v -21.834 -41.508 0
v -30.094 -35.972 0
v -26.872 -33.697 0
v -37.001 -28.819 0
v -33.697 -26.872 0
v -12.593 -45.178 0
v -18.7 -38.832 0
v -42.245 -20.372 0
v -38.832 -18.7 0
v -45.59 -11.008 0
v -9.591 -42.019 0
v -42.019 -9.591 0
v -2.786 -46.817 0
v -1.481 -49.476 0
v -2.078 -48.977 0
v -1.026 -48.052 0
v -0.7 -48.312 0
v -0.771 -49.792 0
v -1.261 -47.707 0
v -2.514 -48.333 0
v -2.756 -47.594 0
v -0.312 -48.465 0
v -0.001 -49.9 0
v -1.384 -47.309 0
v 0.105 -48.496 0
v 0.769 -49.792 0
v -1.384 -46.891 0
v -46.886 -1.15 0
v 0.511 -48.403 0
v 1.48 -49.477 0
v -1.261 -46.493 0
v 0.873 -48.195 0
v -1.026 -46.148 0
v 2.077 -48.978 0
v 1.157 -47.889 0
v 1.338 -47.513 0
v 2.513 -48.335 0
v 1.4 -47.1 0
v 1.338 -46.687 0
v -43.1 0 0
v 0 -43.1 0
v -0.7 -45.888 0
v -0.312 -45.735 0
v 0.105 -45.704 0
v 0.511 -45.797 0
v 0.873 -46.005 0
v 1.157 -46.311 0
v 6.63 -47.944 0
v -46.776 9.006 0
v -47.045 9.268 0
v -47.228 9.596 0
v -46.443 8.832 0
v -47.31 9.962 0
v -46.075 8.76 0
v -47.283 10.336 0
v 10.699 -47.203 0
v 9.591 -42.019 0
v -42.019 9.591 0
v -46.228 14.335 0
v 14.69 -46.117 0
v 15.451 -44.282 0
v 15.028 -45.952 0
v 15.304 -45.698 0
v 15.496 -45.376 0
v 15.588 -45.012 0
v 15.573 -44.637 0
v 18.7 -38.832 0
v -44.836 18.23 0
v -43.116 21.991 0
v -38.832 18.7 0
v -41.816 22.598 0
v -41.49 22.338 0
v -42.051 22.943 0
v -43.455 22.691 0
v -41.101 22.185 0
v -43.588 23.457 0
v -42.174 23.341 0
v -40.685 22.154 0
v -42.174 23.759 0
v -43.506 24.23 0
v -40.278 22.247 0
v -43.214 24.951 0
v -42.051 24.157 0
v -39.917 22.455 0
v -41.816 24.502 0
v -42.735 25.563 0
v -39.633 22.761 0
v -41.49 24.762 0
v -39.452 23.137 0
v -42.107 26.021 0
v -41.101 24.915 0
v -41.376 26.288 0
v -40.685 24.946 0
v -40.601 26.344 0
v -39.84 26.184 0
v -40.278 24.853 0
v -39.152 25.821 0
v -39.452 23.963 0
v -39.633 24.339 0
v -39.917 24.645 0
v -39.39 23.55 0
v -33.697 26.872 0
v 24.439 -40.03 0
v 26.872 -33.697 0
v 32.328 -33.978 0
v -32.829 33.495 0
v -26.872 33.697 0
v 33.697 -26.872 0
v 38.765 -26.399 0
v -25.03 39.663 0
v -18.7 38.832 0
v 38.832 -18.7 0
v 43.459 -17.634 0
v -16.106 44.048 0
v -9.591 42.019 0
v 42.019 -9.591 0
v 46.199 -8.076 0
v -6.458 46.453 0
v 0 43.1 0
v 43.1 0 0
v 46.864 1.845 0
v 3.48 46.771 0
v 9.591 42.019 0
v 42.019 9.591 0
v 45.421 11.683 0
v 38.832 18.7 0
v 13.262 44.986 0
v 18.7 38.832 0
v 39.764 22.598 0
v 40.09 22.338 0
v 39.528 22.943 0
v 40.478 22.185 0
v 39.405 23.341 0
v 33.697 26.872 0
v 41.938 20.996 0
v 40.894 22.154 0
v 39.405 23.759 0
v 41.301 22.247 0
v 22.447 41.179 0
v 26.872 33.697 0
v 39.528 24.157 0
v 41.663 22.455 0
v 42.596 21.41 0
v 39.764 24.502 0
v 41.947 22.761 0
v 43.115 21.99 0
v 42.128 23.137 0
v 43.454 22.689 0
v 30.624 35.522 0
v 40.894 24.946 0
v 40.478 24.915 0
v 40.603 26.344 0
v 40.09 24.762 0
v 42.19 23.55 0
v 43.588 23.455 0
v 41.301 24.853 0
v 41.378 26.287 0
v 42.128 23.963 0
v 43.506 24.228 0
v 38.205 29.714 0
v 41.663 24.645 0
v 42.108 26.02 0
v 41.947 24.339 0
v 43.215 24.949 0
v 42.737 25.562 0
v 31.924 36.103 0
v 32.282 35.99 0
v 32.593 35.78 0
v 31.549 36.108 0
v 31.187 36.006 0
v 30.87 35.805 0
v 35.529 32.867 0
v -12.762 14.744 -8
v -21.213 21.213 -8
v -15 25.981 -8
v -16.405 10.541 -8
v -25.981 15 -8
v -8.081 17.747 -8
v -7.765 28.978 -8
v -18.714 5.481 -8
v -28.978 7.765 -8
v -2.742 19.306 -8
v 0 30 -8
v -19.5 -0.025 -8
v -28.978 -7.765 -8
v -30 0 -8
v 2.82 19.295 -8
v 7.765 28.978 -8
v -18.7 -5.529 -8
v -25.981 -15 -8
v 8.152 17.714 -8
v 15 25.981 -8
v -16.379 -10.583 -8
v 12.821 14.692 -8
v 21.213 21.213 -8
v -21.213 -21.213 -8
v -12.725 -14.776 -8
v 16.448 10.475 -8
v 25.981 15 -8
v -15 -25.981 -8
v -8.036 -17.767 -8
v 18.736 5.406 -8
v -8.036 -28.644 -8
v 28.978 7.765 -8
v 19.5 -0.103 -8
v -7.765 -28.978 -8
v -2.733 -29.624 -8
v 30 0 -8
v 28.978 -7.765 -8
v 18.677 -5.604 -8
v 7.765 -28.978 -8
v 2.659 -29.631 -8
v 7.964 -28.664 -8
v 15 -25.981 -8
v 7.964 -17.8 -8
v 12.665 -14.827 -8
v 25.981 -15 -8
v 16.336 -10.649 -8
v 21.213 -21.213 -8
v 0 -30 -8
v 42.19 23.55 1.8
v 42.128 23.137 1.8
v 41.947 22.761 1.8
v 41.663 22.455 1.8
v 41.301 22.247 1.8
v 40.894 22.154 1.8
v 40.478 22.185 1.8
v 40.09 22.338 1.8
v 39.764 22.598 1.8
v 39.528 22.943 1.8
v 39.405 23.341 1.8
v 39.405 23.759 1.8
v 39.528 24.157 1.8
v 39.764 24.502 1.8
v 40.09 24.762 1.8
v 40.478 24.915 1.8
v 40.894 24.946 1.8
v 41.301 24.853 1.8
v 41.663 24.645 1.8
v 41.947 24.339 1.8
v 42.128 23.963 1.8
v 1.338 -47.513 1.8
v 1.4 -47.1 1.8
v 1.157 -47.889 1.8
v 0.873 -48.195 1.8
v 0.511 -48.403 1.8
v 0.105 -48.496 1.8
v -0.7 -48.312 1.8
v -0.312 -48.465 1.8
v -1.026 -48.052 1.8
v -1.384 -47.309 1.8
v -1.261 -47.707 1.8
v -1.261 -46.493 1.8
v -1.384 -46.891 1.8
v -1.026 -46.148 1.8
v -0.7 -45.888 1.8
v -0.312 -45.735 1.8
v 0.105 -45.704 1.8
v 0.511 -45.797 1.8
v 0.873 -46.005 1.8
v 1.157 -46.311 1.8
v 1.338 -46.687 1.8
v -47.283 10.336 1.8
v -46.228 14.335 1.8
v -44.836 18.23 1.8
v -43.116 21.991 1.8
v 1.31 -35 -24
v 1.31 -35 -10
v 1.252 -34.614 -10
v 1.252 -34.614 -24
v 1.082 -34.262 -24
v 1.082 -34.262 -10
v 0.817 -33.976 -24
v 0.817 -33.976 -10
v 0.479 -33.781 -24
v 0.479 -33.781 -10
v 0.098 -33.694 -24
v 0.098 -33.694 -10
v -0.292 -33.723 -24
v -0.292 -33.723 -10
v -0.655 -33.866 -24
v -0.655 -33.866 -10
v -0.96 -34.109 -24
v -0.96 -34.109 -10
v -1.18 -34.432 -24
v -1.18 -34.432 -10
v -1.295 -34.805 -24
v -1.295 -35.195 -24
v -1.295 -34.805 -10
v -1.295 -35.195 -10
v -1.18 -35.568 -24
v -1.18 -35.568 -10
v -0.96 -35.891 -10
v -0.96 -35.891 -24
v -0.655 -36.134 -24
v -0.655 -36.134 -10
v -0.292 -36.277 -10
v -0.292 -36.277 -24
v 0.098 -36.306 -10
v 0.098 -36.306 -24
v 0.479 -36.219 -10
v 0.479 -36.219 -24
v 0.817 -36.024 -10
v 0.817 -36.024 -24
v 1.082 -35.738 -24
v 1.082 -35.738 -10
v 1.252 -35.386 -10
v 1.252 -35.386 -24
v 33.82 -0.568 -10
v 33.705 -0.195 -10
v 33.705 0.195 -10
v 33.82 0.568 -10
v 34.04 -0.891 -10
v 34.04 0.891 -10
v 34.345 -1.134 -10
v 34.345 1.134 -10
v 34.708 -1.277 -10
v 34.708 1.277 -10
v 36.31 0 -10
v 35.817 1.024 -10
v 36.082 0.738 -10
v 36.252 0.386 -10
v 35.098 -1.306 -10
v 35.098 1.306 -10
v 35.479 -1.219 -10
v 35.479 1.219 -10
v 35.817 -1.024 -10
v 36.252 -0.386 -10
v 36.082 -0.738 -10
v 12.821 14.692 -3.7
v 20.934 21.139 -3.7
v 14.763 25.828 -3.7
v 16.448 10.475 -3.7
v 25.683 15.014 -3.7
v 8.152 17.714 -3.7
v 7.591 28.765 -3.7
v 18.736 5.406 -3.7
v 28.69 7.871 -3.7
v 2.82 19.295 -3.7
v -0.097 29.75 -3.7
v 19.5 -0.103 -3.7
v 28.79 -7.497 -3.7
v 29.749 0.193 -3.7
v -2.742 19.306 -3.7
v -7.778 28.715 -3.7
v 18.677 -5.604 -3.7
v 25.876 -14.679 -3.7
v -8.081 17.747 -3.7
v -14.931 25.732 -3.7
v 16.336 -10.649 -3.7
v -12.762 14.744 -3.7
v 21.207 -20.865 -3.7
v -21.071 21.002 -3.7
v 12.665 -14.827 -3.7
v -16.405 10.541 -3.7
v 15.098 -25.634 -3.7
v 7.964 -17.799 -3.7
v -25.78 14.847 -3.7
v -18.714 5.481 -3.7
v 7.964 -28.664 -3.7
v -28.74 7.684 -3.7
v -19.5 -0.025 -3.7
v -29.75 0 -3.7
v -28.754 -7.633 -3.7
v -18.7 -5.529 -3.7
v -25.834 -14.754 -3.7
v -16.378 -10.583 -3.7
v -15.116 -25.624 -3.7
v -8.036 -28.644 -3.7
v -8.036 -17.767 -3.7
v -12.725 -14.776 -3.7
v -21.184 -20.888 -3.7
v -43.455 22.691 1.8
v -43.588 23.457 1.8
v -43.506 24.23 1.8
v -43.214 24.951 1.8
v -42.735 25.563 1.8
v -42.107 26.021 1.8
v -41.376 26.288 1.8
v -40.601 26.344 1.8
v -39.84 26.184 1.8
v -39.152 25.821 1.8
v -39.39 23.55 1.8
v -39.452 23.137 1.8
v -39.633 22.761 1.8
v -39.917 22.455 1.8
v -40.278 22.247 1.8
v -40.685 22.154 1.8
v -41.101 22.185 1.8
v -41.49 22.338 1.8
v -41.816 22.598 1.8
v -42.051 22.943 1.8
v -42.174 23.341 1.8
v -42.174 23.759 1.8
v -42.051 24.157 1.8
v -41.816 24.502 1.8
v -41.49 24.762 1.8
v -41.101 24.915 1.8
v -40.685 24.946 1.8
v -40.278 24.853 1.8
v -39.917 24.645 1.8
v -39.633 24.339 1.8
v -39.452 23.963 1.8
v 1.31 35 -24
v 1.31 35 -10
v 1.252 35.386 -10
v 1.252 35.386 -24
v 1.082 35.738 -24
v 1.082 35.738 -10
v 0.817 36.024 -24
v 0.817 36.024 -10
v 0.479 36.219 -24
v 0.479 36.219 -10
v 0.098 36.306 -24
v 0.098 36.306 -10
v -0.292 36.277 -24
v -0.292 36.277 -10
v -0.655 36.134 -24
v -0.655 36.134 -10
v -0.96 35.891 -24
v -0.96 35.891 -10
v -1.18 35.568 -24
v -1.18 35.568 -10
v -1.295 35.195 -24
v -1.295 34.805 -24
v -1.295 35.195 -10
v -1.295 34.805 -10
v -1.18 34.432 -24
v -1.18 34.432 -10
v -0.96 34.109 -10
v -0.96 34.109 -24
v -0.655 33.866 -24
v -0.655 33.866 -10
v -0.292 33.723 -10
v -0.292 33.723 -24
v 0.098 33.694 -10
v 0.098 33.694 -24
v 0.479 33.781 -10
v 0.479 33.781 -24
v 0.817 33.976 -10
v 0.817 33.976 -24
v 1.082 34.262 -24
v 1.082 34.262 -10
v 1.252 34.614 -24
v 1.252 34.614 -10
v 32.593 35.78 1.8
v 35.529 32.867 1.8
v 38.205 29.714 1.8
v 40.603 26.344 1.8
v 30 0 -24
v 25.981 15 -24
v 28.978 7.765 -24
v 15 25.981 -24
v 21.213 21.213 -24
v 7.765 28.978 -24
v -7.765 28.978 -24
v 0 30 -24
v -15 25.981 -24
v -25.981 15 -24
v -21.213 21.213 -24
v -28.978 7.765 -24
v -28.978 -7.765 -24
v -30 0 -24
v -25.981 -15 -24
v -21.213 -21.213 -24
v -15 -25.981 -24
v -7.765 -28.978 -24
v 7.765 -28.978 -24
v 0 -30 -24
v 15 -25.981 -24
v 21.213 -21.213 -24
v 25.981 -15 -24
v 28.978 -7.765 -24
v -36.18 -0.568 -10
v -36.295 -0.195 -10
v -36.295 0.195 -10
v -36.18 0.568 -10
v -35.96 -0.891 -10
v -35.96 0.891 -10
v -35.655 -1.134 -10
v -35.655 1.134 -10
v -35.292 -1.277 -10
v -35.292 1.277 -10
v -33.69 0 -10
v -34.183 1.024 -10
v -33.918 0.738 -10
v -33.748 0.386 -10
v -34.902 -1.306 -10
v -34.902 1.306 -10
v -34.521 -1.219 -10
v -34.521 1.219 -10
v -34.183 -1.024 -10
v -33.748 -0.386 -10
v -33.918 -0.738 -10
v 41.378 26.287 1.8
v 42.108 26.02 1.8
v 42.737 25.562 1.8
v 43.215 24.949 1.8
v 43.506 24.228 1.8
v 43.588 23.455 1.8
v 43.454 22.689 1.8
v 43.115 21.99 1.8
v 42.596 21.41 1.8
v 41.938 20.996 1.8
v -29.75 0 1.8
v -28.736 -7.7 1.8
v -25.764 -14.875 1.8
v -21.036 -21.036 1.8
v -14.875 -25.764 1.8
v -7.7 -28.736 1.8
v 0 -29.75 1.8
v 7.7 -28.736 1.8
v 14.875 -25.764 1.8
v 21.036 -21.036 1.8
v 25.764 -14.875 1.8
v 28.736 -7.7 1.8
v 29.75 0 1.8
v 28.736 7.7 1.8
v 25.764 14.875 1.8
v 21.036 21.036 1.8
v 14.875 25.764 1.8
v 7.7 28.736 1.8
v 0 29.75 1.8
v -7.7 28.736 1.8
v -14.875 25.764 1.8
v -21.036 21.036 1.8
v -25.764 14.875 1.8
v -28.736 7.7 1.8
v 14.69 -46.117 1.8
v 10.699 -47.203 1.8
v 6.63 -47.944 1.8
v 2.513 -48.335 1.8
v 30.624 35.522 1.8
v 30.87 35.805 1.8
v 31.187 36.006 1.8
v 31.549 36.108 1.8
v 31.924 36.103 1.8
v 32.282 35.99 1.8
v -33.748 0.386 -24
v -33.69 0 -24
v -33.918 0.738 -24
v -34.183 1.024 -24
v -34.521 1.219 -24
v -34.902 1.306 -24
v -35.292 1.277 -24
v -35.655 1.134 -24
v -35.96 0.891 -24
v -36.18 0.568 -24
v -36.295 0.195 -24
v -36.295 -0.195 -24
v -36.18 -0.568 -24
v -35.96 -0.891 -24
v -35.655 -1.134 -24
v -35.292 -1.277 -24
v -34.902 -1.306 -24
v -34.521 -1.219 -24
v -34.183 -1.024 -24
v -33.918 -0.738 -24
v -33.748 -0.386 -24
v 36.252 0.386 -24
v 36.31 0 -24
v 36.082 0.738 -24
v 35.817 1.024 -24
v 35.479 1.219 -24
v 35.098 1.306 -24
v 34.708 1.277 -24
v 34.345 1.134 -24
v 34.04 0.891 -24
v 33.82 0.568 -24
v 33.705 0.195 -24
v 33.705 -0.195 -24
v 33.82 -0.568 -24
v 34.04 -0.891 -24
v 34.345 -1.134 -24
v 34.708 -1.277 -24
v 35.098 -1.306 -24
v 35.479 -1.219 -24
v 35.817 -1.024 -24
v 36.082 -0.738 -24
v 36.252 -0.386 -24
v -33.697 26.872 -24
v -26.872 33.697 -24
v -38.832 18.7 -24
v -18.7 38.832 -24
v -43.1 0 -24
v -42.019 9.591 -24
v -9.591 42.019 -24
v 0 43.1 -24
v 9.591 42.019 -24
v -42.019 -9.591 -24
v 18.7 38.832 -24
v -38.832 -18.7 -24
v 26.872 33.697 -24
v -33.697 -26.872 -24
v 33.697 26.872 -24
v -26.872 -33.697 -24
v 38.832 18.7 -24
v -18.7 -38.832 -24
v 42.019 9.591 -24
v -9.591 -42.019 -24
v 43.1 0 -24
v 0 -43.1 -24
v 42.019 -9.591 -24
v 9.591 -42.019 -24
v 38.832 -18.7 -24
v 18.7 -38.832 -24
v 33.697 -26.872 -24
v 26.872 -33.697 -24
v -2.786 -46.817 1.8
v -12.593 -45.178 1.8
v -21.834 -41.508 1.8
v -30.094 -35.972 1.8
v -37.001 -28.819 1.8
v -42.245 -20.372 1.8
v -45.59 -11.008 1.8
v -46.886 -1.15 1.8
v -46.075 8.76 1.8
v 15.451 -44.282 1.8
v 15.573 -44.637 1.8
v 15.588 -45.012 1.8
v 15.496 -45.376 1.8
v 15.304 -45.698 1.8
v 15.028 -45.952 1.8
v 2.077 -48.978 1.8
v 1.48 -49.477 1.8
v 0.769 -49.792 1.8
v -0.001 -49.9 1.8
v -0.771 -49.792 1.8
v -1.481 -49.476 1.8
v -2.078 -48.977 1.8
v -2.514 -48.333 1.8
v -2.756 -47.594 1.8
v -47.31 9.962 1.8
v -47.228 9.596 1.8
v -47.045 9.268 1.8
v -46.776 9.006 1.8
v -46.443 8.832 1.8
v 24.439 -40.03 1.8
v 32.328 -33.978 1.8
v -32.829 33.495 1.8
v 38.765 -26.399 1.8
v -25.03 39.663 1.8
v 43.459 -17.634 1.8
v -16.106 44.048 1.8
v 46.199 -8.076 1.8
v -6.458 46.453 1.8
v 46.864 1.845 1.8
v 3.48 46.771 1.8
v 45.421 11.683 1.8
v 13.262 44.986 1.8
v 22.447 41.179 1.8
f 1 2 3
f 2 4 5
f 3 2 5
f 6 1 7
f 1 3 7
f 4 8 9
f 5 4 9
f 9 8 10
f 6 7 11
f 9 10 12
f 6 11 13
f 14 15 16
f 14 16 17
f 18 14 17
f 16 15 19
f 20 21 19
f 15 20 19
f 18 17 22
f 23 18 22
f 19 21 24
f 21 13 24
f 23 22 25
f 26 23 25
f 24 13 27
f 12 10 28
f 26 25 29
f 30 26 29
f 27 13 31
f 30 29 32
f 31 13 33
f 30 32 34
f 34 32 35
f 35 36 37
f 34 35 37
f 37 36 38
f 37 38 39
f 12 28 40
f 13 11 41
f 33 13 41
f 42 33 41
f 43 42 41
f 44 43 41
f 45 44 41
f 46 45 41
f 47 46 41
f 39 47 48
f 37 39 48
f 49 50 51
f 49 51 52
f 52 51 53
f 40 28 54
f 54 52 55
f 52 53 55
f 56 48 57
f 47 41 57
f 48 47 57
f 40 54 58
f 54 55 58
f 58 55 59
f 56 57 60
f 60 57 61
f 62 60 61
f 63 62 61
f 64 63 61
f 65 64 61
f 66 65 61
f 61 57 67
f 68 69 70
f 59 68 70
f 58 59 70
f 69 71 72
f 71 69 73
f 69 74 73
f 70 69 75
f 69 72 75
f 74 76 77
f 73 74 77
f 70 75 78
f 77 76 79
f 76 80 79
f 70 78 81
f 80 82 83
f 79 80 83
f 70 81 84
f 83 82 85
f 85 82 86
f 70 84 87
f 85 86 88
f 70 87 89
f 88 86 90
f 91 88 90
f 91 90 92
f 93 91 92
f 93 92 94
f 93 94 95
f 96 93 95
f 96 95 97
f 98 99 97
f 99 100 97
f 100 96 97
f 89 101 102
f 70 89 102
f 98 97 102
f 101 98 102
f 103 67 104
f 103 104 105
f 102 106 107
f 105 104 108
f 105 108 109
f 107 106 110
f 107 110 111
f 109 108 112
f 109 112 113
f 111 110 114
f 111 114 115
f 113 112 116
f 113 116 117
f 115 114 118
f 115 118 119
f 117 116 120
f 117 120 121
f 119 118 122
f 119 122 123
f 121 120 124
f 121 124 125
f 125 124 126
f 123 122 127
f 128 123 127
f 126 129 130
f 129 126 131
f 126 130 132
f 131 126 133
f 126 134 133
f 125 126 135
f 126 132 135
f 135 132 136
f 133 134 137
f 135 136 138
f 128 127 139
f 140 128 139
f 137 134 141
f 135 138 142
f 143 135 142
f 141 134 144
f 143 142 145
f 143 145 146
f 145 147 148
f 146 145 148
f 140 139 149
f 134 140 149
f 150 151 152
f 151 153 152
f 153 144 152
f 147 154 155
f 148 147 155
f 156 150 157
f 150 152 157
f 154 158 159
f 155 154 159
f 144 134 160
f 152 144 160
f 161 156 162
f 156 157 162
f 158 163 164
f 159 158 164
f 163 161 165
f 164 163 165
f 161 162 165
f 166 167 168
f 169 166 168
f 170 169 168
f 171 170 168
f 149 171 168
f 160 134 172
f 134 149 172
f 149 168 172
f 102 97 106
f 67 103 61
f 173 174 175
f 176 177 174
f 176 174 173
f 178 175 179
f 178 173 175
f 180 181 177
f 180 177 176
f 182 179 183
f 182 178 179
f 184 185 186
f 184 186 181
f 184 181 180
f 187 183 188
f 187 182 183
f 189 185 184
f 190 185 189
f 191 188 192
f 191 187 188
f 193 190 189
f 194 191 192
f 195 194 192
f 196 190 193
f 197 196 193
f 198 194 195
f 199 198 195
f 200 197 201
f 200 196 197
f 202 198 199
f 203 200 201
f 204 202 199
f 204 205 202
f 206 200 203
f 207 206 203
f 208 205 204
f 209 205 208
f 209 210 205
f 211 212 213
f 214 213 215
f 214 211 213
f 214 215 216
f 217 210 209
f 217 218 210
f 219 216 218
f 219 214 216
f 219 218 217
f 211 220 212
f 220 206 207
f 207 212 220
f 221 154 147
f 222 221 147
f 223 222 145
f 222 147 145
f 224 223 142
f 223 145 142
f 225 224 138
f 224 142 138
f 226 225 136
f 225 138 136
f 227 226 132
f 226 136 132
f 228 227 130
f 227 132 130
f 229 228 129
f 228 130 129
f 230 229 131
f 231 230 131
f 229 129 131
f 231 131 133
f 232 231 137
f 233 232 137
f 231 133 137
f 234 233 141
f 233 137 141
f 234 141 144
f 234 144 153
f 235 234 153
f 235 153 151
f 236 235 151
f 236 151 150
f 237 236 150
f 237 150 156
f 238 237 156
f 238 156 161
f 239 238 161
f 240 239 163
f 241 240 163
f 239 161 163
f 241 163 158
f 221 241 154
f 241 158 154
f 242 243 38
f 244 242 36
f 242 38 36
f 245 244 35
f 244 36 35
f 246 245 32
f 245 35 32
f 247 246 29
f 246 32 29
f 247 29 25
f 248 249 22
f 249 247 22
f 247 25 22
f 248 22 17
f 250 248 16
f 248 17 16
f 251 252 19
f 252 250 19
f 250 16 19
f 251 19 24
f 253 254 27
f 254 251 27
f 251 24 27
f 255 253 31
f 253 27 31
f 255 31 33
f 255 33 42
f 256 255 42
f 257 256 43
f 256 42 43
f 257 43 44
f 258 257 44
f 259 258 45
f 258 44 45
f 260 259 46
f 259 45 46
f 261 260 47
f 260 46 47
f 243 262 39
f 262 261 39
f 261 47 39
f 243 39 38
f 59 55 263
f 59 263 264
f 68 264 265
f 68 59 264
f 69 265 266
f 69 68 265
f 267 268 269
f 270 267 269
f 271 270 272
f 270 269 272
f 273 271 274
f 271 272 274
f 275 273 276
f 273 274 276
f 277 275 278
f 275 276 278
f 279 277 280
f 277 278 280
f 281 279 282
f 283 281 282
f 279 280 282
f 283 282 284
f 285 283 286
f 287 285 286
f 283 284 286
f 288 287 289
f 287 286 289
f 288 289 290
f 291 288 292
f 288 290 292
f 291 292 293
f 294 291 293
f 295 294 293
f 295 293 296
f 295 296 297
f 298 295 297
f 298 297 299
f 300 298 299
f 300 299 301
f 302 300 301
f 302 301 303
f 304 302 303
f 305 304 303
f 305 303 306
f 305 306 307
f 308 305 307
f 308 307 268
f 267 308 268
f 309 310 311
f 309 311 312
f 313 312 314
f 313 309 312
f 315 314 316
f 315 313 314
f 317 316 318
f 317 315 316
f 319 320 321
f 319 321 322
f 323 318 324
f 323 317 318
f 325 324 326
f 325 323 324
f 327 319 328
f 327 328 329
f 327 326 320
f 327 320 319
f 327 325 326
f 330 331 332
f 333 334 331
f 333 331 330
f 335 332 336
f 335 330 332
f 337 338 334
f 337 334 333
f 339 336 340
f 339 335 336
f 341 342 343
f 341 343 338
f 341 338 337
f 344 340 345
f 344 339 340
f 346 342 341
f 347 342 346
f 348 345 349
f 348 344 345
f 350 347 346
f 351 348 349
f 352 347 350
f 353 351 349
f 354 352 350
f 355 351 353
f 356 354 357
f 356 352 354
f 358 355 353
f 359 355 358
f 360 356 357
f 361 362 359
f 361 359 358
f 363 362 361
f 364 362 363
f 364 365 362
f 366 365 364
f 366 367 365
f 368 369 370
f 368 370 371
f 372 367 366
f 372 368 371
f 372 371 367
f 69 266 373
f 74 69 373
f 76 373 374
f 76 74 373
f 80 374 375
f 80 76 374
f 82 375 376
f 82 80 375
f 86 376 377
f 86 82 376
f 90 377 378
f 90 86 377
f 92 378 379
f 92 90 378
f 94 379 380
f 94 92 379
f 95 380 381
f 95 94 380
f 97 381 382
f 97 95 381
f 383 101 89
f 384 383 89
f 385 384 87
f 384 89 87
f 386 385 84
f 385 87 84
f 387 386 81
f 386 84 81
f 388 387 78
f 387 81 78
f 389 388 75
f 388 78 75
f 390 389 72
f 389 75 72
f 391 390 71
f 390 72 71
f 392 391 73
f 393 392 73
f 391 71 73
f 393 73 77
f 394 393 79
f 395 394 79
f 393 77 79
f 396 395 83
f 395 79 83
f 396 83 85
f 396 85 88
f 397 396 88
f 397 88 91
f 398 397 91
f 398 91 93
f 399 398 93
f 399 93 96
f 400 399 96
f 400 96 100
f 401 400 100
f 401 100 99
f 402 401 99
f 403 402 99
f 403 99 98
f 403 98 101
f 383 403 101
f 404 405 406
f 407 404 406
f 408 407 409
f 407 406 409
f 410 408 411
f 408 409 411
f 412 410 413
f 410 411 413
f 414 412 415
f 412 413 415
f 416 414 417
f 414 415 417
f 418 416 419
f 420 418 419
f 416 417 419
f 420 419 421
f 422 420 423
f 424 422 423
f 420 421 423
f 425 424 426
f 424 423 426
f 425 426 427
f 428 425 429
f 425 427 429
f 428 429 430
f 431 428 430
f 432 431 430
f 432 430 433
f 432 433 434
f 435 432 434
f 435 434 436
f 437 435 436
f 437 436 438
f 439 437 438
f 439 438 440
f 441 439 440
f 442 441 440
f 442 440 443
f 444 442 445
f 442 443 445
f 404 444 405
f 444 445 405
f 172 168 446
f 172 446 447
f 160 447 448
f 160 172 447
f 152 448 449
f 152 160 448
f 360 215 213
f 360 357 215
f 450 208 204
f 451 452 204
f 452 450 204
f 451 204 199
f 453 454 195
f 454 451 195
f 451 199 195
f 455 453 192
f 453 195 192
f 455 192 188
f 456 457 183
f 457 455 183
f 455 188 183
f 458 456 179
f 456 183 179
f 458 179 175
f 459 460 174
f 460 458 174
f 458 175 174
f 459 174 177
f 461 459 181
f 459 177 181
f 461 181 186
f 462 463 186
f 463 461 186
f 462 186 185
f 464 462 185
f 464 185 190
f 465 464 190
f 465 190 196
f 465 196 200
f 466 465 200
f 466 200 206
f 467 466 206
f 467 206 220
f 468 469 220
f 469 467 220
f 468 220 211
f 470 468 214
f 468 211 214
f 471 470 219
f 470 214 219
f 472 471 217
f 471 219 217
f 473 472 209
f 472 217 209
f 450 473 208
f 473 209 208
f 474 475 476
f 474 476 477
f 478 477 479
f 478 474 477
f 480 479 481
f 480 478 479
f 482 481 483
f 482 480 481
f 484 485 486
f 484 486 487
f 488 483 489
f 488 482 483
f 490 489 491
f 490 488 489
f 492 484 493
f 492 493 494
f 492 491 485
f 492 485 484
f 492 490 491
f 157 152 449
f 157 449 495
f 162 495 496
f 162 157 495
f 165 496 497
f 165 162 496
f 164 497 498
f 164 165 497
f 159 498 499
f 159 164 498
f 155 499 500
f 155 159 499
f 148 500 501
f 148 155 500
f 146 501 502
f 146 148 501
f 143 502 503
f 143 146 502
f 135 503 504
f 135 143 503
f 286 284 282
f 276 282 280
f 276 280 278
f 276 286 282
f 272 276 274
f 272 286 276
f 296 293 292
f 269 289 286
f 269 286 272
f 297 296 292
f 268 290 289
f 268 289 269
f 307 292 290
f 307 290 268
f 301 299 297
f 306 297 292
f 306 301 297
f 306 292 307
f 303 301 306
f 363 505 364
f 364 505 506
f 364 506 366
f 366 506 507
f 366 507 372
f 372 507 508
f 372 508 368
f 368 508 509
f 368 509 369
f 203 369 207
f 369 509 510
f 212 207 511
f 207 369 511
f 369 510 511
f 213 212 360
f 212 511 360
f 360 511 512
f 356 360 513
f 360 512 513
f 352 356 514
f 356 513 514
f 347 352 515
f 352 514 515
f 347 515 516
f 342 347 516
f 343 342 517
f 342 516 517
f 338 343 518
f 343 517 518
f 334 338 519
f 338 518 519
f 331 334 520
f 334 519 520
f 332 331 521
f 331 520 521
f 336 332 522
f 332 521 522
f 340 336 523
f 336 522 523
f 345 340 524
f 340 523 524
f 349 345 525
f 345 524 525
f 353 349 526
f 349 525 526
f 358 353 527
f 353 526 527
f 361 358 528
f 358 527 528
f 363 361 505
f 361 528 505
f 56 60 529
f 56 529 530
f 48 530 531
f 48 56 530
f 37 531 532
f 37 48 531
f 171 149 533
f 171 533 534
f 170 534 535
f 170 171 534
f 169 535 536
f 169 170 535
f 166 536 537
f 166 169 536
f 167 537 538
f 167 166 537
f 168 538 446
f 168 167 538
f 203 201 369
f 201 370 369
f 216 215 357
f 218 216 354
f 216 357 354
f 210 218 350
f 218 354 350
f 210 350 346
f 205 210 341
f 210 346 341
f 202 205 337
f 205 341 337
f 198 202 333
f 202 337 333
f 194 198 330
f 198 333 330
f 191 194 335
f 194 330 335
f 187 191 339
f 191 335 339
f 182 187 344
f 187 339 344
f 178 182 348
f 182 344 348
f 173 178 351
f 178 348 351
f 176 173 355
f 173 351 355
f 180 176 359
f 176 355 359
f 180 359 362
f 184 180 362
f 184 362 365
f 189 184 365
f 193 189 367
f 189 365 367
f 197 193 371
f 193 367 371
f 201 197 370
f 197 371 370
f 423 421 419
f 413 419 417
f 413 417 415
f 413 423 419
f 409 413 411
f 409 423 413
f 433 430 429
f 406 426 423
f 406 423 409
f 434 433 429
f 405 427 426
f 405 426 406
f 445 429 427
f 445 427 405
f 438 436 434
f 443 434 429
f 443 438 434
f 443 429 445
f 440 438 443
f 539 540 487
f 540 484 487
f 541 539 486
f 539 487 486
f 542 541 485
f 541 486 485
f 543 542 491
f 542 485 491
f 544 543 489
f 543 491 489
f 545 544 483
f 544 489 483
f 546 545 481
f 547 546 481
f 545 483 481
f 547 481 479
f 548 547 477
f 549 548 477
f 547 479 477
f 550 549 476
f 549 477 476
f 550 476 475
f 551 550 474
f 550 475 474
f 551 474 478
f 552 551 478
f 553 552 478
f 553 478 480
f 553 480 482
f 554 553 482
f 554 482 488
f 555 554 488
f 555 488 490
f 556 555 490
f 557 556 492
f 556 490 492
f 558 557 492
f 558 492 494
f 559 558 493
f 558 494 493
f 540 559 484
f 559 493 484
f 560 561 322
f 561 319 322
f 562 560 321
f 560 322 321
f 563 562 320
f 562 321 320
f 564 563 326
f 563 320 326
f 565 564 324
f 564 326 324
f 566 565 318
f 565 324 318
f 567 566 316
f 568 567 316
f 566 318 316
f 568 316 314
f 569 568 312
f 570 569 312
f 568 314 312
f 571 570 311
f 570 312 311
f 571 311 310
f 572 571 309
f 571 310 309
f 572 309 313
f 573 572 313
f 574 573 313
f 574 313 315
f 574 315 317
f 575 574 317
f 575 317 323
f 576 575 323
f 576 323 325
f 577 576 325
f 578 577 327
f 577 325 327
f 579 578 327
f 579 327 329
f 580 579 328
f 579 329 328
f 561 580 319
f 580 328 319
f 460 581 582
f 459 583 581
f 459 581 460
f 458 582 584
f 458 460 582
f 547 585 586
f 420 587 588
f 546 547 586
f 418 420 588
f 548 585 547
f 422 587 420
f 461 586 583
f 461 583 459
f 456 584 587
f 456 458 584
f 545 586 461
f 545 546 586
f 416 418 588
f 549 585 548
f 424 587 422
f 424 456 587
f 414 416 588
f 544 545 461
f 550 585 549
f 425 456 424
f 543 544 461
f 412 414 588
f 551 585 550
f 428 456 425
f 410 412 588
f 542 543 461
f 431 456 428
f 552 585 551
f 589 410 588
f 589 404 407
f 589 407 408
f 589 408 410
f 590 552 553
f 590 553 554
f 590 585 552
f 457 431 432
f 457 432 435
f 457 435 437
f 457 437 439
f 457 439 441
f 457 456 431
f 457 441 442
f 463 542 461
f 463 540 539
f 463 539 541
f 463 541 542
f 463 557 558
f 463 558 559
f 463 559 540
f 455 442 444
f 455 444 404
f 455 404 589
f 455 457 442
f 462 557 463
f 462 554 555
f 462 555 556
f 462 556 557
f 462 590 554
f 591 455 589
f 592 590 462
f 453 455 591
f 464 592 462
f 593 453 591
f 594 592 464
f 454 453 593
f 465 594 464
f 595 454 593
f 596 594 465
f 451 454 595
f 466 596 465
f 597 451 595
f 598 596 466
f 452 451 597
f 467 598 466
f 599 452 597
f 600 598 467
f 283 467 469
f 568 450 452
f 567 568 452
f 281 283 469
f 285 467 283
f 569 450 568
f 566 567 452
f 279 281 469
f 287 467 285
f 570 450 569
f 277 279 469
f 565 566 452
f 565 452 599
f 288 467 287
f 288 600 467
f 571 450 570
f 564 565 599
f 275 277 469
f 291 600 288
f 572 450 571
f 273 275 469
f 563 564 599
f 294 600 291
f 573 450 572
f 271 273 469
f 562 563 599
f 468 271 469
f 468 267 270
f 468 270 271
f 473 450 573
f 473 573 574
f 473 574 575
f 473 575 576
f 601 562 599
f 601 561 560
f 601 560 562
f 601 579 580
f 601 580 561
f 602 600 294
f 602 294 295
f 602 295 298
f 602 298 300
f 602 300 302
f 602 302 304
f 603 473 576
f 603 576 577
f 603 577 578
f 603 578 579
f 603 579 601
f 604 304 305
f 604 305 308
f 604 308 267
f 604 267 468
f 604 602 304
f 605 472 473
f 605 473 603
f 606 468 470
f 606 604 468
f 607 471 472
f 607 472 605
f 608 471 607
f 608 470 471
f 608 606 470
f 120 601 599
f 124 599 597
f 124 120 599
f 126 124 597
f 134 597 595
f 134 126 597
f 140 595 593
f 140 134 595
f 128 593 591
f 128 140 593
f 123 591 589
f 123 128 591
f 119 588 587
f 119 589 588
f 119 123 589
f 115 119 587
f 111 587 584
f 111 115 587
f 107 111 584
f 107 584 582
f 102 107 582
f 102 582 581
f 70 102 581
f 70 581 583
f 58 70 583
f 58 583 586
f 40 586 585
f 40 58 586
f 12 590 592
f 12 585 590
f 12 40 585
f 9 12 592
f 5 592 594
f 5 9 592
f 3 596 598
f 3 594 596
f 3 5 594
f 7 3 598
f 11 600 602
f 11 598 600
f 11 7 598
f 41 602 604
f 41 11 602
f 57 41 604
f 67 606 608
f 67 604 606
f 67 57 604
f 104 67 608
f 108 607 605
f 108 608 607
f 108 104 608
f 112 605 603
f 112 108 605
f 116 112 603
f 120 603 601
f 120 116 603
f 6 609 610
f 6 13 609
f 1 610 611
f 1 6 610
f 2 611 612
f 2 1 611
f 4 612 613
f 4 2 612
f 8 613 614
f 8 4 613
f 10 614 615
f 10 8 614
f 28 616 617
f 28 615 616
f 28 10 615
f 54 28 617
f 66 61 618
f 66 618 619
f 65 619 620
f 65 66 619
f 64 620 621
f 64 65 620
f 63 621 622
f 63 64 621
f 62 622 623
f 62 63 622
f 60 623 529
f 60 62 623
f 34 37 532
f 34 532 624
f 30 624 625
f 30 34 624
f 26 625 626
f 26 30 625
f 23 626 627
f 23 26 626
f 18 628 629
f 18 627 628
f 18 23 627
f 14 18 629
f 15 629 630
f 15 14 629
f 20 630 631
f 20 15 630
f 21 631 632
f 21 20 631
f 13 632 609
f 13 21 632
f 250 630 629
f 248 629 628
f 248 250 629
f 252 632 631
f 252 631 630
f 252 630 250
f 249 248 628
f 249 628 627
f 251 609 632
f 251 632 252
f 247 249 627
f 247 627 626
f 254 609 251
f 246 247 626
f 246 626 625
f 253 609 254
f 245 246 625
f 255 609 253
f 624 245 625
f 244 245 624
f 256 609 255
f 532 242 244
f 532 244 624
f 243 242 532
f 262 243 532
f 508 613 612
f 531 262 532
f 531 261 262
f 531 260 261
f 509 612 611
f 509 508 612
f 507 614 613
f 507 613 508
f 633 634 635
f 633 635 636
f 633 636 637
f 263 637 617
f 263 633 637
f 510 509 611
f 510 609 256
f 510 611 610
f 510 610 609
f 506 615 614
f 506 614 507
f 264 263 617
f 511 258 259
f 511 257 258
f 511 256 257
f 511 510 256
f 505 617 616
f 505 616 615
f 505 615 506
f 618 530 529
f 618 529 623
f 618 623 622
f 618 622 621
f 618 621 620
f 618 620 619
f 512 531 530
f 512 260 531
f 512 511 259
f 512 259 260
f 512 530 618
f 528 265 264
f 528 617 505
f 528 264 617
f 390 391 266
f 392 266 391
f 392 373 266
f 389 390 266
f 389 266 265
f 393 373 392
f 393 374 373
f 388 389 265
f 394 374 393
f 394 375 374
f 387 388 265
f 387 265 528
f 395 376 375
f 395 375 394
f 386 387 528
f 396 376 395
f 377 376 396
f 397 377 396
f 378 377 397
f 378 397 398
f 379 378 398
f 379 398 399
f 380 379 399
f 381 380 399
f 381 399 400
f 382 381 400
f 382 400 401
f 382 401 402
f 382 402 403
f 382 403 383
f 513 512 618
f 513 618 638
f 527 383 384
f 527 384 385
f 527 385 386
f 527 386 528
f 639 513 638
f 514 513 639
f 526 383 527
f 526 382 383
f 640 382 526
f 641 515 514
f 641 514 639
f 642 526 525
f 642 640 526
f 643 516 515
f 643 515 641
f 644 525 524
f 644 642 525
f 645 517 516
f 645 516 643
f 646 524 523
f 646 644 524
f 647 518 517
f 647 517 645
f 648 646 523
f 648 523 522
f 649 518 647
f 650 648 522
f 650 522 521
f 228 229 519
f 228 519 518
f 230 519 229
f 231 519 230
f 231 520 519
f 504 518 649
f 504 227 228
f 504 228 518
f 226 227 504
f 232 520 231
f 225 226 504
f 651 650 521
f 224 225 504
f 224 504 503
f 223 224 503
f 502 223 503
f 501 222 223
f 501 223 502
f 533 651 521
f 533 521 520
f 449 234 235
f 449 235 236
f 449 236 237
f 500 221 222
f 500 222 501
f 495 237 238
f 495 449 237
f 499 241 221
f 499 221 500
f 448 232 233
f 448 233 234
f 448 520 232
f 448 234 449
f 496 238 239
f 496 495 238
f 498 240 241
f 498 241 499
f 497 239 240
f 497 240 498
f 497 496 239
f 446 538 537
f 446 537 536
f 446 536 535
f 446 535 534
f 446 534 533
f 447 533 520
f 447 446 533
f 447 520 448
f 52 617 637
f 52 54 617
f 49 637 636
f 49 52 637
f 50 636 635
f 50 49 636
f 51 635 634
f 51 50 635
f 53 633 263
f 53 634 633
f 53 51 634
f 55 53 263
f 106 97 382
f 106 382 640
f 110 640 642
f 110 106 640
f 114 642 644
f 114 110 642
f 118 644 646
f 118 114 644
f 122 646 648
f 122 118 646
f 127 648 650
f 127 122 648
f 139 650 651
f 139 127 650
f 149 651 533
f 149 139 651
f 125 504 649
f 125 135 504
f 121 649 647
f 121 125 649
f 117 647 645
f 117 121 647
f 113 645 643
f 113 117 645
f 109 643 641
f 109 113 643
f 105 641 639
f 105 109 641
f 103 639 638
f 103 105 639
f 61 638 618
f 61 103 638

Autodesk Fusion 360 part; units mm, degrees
sketch "草图1" plane through (0, 0, 0) normal (0, 0, 1) x (1, 0, 0)
  line L0 (28.4627, -32.3648) -> (28.4702, -32.3737)
  line L1 (41.5939, -11.2943) -> (41.768, -11.325)
  arc A0 (14.7507, -46.3074) -> (13.8402, -43.4489) centre (14.2954, -44.8782) ccw construction
  line L2 (-28.4627, -32.3648) -> (-28.4702, -32.3737)
  circle A1 centre (0, -47.1) radius 1.4
  line L3 (43.1, 0) -> (48, 0) construction
  line L4 (0, -43.1) -> (0, -51.1) construction
  arc A2 (2.5554, -45.5283) -> (2.6381, -48.5283) centre (0, -47.1) ccw construction
  circle A3 centre (0, 0) radius 44.72 construction
  arc A4 (2.6381, -48.5283) -> (14.7507, -46.3074) centre (0, 0) ccw construction
  line L5 (-30.5781, -30.3742) -> (-30.6917, -30.5096)
  line L6 (-41.5939, -11.2943) -> (-41.768, -11.325)
  line L7 (30.5781, -30.3742) -> (30.6917, -30.5096)
  line L8 (42.2601, -8.467) -> (42.2716, -8.469)
  line L9 (-42.2601, -8.467) -> (-42.2716, -8.469)
  line L10 (0.9, -43.0906) -> (0.9, -43.1)
  arc A5 (2.5554, -45.5283) -> (13.8402, -43.4489) centre (0, 0) ccw construction
  line L11 (-0.9, -43.0906) -> (-0.9, -43.1)
  circle A6 centre (0, 0) radius 43.1
  arc A7 (40.7077, 26.5489) -> (32.728, 35.9282) centre (0, 0) ccw construction
  line L12 (11.0158, 41.6685) -> (11.0763, 41.8346)
  line L13 (13.7974, 40.8319) -> (13.8014, 40.8428)
  line L14 (36.8676, 22.3247) -> (36.8757, 22.3294)
  arc A8 (32.728, 35.9282) -> (30.7078, 33.7104) centre (31.7179, 34.8193) ccw construction
  circle A9 centre (40.7898, 23.55) radius 1.4
  circle A10 centre (-40.7898, 23.55) radius 1.4
  line L15 (-15.6751, 9.05) -> (-16.3679, 9.45) construction
  arc A11 (38.151, 24.9772) -> (30.7078, 33.7104) centre (0, 0) ccw construction
  line L16 (-13.7974, 40.8319) -> (-13.8014, 40.8428)
  line L17 (37.7676, 20.7659) -> (37.7757, 20.7706)
  arc A12 (-40.7064, 20.5512) -> (-44.548, 9.7385) centre (0, 0) ccw construction
  arc A13 (-47.4788, 10.3792) -> (-44.548, 9.7385) centre (-46.0134, 10.0589) ccw construction
  circle A14 centre (0, 0) radius 47.1 construction
  arc A15 (-43.3459, 21.9795) -> (-47.4788, 10.3792) centre (0, 0) ccw construction
  line L18 (-37.7676, 20.7659) -> (-37.7757, 20.7706)
  line L19 (-36.8676, 22.3247) -> (-36.8757, 22.3294)
  arc A16 (38.151, 24.9772) -> (40.7077, 26.5489) centre (40.7898, 23.55) ccw construction
  circle A17 centre (0, 0) radius 47.1 construction
  line L20 (-11.0158, 41.6685) -> (-11.0763, 41.8346)
  line L21 (-37.3257, 21.55) -> (-41.5692, 24) construction
  arc A18 (-40.7064, 20.5512) -> (-43.3459, 21.9795) centre (-40.7898, 23.55) ccw construction
  circle A19 centre (0, 0) radius 46.9
  arc A20 (32.5934, 35.7803) -> (30.8425, 33.8583) centre (31.7179, 34.8193) ccw
  arc A21 (38.3851, 24.9844) -> (30.8425, 33.8583) centre (0, 0) ccw
  arc A22 (38.3851, 24.9844) -> (40.6026, 26.3437) centre (40.7898, 23.55) ccw
  arc A23 (40.6026, 26.3437) -> (32.5934, 35.7803) centre (0, 0) ccw
  arc A24 (2.4446, -45.7347) -> (13.9009, -43.6395) centre (0, 0) ccw
  arc A25 (14.69, -46.1168) -> (13.9009, -43.6395) centre (14.2954, -44.8782) ccw
  arc A26 (2.5131, -48.3347) -> (14.69, -46.1168) centre (0, 0) ccw
  arc A27 (2.4446, -45.7347) -> (2.5131, -48.3347) centre (0, -47.1) ccw
  arc A28 (-47.2834, 10.3365) -> (-44.7434, 9.7812) centre (-46.0134, 10.0589) ccw
  arc A29 (-40.8297, 20.7503) -> (-44.7434, 9.7812) centre (0, 0) ccw
  arc A30 (-40.8297, 20.7503) -> (-43.1156, 21.991) centre (-40.7898, 23.55) ccw
  arc A31 (-43.1156, 21.991) -> (-47.2834, 10.3365) centre (0, 0) ccw
  circle A32 centre (0, 0) radius 19.5
  dimension "d43" = 1.8
  dimension "d44" = 6
  dimension "d45" = 3
  dimension "d46" = 2.8
  dimension "d47" = 2.8
  dimension "d48" = 2.8
  dimension "d49" = 86.2
  dimension "d53" = -0.2
  dimension "d54" = -0.2
  dimension "d55" = -0.2
  dimension "d56" = -0.2
  dimension "d57" = 39
extrude "拉伸5" add sketch "草图1" along normal blind 1.8 contours A1 A19 A25 A26 A27 | A1 A19 A24 A25 A27 | A19 A20 A21 A22 A24 A25 A27 A28 A29 A30 | A10 A19 A28 A30 A31 | A10 A19 A28 A29 A30 | A9 A19 A20 A21 A22 | A9 A19 A20 A22 A23
extrude "拉伸6" add sketch "草图1" along normal up to surface (1.8 mm away) contours A6
sketch "草图3" plane through (0, 0, 1.8) normal (0, 0, 1) x (-1, 0, 0)
  circle A0 centre (0, 0) radius 19.5
  circle A1 centre (40.7898, -23.55) radius 1.4
  circle A2 centre (-40.7898, -23.55) radius 1.4
  circle A3 centre (0, 47.1) radius 1.4
  arc A4 (43.1156, -21.991) -> (47.2834, -10.3365) centre (0, 0) ccw
  arc A5 (47.2834, -10.3365) -> (46.0746, -8.7603) centre (46.0134, -10.0589) ccw
  arc A6 (46.0746, -8.7603) -> (2.7857, 46.8172) centre (0, 0) ccw
  arc A7 (2.7857, 46.8172) -> (-2.5131, 48.3347) centre (0, 47.1) ccw
  arc A8 (-2.5131, 48.3347) -> (-14.69, 46.1168) centre (0, 0) ccw
  arc A9 (-14.69, 46.1168) -> (-15.4506, 44.2819) centre (-14.2954, 44.8782) ccw
  arc A10 (-15.4506, 44.2819) -> (-41.9377, -20.9961) centre (0, 0) ccw
  arc A11 (-41.9377, -20.9961) -> (-40.6026, -26.3437) centre (-40.7898, -23.55) ccw
  arc A12 (-40.6026, -26.3437) -> (-32.5934, -35.7803) centre (0, 0) ccw
  arc A13 (-32.5934, -35.7803) -> (-30.6239, -35.5216) centre (-31.7179, -34.8193) ccw
  arc A14 (-30.6239, -35.5216) -> (39.152, -25.8211) centre (0, 0) ccw
  arc A15 (39.152, -25.8211) -> (43.1156, -21.991) centre (40.7898, -23.55) ccw
  circle A16 centre (0, 0) radius 29.75
  dimension "d64" = 59.5
sketch "草图4" plane through (0, 0, 0) normal (0, 0, -1) x (1, 0, 0)
  circle A0 centre (0, 0) radius 19.5
  circle A1 centre (-40.7898, -23.55) radius 1.4
  circle A2 centre (40.7898, -23.55) radius 1.4
  circle A3 centre (0, 47.1) radius 1.4
  arc A4 (-47.2834, -10.3365) -> (-43.1156, -21.991) centre (0, 0) ccw
  arc A5 (-43.1156, -21.991) -> (-39.152, -25.8211) centre (-40.7898, -23.55) ccw
  arc A6 (-39.152, -25.8211) -> (30.6239, -35.5216) centre (0, 0) ccw
  arc A7 (30.6239, -35.5216) -> (32.5934, -35.7803) centre (31.7179, -34.8193) ccw
  arc A8 (32.5934, -35.7803) -> (40.6026, -26.3437) centre (0, 0) ccw
  arc A9 (40.6026, -26.3437) -> (41.9377, -20.9961) centre (40.7898, -23.55) ccw
  arc A10 (41.9377, -20.9961) -> (15.4506, 44.2819) centre (0, 0) ccw
  arc A11 (15.4506, 44.2819) -> (14.69, 46.1168) centre (14.2954, 44.8782) ccw
  arc A12 (14.69, 46.1168) -> (2.5131, 48.3347) centre (0, 0) ccw
  arc A13 (2.5131, 48.3347) -> (-2.7857, 46.8172) centre (0, 47.1) ccw
  arc A14 (-2.7857, 46.8172) -> (-46.0746, -8.7603) centre (0, 0) ccw
  arc A15 (-46.0746, -8.7603) -> (-47.2834, -10.3365) centre (-46.0134, -10.0589) ccw
  circle A16 centre (0, 0) radius 43.1
  dimension "d65" = 86.2
extrude "拉伸8" add sketch "草图4" along normal blind 18 contours A16
extrude "拉伸9" cut sketch "草图3" against normal blind 5.5 contours A16
sketch "草图5" plane through (0, 0, -3.7) normal (0, 0, 1) x (-1, 0, 0)
  circle A0 centre (0, 0) radius 19.5
  circle A1 centre (0, 0) radius 29.75
  line L0 (0.0358, 19.5) -> (0.0358, 29.75)
  line L1 (8.0358, 17.7673) -> (8.0358, 28.6442)
  line L2 (-7.9642, 17.7673) -> (-7.9642, 28.6642)
extrude "拉伸10" cut sketch "草图5" against normal blind 20 contours A0 A1 L0 L1 | A0 A1 L0 L2
sketch "草图6" plane through (0, 0, -18) normal (0, 0, -1) x (1, 0, 0)
  circle A0 centre (0, 0) radius 43.1
  line L0 (-8.0358, 17.7673) -> (-8.0358, 28.6442)
  arc A1 (7.9642, 28.6642) -> (-8.0358, 28.6442) centre (0, 0) ccw
  line L1 (7.9642, 28.6642) -> (7.9642, 17.7995)
  arc A2 (-8.0358, 17.7673) -> (7.9642, 17.7995) centre (0, 0) ccw
  circle A3 centre (0, 0) radius 35
  circle A4 centre (0, -35) radius 1.31
  circle A5 centre (35, 0) radius 1.31
  circle A6 centre (0, 35) radius 1.31
  circle A7 centre (-35, 0) radius 1.31
  dimension "d73" = 70
  dimension "d74" = 2.62
  dimension "d76" = 360
extrude "拉伸11" cut sketch "草图6" against normal blind 8 contours A3 A5 | A3 A5 | A3 A6 | A3 A6 | A3 A4 | A3 A4 | A3 A7 | A3 A7
sketch "草图7" plane through (0, 0, -18) normal (0, 0, -1) x (1, 0, 0)
  circle A0 centre (35, 0) radius 1.31
  circle A1 centre (-35, 0) radius 1.31
  circle A2 centre (0, -35) radius 1.31
  circle A3 centre (0, 35) radius 1.31
  circle A4 centre (0, 0) radius 43.1
  line L0 (-8.0358, 17.7673) -> (-8.0358, 28.6442)
  arc A5 (7.9642, 28.6642) -> (-8.0358, 28.6442) centre (0, 0) ccw
  line L1 (7.9642, 28.6642) -> (7.9642, 17.7995)
  arc A6 (-8.0358, 17.7673) -> (7.9642, 17.7995) centre (0, 0) ccw
  circle A7 centre (0, 0) radius 30
  dimension "d79" = 60
extrude "拉伸12" cut sketch "草图7" against normal blind 10 contours A7
extrude "拉伸13" add 1 faces at (34.9911, 7.617, -18) along direction (0, 0, -1) blind 6
